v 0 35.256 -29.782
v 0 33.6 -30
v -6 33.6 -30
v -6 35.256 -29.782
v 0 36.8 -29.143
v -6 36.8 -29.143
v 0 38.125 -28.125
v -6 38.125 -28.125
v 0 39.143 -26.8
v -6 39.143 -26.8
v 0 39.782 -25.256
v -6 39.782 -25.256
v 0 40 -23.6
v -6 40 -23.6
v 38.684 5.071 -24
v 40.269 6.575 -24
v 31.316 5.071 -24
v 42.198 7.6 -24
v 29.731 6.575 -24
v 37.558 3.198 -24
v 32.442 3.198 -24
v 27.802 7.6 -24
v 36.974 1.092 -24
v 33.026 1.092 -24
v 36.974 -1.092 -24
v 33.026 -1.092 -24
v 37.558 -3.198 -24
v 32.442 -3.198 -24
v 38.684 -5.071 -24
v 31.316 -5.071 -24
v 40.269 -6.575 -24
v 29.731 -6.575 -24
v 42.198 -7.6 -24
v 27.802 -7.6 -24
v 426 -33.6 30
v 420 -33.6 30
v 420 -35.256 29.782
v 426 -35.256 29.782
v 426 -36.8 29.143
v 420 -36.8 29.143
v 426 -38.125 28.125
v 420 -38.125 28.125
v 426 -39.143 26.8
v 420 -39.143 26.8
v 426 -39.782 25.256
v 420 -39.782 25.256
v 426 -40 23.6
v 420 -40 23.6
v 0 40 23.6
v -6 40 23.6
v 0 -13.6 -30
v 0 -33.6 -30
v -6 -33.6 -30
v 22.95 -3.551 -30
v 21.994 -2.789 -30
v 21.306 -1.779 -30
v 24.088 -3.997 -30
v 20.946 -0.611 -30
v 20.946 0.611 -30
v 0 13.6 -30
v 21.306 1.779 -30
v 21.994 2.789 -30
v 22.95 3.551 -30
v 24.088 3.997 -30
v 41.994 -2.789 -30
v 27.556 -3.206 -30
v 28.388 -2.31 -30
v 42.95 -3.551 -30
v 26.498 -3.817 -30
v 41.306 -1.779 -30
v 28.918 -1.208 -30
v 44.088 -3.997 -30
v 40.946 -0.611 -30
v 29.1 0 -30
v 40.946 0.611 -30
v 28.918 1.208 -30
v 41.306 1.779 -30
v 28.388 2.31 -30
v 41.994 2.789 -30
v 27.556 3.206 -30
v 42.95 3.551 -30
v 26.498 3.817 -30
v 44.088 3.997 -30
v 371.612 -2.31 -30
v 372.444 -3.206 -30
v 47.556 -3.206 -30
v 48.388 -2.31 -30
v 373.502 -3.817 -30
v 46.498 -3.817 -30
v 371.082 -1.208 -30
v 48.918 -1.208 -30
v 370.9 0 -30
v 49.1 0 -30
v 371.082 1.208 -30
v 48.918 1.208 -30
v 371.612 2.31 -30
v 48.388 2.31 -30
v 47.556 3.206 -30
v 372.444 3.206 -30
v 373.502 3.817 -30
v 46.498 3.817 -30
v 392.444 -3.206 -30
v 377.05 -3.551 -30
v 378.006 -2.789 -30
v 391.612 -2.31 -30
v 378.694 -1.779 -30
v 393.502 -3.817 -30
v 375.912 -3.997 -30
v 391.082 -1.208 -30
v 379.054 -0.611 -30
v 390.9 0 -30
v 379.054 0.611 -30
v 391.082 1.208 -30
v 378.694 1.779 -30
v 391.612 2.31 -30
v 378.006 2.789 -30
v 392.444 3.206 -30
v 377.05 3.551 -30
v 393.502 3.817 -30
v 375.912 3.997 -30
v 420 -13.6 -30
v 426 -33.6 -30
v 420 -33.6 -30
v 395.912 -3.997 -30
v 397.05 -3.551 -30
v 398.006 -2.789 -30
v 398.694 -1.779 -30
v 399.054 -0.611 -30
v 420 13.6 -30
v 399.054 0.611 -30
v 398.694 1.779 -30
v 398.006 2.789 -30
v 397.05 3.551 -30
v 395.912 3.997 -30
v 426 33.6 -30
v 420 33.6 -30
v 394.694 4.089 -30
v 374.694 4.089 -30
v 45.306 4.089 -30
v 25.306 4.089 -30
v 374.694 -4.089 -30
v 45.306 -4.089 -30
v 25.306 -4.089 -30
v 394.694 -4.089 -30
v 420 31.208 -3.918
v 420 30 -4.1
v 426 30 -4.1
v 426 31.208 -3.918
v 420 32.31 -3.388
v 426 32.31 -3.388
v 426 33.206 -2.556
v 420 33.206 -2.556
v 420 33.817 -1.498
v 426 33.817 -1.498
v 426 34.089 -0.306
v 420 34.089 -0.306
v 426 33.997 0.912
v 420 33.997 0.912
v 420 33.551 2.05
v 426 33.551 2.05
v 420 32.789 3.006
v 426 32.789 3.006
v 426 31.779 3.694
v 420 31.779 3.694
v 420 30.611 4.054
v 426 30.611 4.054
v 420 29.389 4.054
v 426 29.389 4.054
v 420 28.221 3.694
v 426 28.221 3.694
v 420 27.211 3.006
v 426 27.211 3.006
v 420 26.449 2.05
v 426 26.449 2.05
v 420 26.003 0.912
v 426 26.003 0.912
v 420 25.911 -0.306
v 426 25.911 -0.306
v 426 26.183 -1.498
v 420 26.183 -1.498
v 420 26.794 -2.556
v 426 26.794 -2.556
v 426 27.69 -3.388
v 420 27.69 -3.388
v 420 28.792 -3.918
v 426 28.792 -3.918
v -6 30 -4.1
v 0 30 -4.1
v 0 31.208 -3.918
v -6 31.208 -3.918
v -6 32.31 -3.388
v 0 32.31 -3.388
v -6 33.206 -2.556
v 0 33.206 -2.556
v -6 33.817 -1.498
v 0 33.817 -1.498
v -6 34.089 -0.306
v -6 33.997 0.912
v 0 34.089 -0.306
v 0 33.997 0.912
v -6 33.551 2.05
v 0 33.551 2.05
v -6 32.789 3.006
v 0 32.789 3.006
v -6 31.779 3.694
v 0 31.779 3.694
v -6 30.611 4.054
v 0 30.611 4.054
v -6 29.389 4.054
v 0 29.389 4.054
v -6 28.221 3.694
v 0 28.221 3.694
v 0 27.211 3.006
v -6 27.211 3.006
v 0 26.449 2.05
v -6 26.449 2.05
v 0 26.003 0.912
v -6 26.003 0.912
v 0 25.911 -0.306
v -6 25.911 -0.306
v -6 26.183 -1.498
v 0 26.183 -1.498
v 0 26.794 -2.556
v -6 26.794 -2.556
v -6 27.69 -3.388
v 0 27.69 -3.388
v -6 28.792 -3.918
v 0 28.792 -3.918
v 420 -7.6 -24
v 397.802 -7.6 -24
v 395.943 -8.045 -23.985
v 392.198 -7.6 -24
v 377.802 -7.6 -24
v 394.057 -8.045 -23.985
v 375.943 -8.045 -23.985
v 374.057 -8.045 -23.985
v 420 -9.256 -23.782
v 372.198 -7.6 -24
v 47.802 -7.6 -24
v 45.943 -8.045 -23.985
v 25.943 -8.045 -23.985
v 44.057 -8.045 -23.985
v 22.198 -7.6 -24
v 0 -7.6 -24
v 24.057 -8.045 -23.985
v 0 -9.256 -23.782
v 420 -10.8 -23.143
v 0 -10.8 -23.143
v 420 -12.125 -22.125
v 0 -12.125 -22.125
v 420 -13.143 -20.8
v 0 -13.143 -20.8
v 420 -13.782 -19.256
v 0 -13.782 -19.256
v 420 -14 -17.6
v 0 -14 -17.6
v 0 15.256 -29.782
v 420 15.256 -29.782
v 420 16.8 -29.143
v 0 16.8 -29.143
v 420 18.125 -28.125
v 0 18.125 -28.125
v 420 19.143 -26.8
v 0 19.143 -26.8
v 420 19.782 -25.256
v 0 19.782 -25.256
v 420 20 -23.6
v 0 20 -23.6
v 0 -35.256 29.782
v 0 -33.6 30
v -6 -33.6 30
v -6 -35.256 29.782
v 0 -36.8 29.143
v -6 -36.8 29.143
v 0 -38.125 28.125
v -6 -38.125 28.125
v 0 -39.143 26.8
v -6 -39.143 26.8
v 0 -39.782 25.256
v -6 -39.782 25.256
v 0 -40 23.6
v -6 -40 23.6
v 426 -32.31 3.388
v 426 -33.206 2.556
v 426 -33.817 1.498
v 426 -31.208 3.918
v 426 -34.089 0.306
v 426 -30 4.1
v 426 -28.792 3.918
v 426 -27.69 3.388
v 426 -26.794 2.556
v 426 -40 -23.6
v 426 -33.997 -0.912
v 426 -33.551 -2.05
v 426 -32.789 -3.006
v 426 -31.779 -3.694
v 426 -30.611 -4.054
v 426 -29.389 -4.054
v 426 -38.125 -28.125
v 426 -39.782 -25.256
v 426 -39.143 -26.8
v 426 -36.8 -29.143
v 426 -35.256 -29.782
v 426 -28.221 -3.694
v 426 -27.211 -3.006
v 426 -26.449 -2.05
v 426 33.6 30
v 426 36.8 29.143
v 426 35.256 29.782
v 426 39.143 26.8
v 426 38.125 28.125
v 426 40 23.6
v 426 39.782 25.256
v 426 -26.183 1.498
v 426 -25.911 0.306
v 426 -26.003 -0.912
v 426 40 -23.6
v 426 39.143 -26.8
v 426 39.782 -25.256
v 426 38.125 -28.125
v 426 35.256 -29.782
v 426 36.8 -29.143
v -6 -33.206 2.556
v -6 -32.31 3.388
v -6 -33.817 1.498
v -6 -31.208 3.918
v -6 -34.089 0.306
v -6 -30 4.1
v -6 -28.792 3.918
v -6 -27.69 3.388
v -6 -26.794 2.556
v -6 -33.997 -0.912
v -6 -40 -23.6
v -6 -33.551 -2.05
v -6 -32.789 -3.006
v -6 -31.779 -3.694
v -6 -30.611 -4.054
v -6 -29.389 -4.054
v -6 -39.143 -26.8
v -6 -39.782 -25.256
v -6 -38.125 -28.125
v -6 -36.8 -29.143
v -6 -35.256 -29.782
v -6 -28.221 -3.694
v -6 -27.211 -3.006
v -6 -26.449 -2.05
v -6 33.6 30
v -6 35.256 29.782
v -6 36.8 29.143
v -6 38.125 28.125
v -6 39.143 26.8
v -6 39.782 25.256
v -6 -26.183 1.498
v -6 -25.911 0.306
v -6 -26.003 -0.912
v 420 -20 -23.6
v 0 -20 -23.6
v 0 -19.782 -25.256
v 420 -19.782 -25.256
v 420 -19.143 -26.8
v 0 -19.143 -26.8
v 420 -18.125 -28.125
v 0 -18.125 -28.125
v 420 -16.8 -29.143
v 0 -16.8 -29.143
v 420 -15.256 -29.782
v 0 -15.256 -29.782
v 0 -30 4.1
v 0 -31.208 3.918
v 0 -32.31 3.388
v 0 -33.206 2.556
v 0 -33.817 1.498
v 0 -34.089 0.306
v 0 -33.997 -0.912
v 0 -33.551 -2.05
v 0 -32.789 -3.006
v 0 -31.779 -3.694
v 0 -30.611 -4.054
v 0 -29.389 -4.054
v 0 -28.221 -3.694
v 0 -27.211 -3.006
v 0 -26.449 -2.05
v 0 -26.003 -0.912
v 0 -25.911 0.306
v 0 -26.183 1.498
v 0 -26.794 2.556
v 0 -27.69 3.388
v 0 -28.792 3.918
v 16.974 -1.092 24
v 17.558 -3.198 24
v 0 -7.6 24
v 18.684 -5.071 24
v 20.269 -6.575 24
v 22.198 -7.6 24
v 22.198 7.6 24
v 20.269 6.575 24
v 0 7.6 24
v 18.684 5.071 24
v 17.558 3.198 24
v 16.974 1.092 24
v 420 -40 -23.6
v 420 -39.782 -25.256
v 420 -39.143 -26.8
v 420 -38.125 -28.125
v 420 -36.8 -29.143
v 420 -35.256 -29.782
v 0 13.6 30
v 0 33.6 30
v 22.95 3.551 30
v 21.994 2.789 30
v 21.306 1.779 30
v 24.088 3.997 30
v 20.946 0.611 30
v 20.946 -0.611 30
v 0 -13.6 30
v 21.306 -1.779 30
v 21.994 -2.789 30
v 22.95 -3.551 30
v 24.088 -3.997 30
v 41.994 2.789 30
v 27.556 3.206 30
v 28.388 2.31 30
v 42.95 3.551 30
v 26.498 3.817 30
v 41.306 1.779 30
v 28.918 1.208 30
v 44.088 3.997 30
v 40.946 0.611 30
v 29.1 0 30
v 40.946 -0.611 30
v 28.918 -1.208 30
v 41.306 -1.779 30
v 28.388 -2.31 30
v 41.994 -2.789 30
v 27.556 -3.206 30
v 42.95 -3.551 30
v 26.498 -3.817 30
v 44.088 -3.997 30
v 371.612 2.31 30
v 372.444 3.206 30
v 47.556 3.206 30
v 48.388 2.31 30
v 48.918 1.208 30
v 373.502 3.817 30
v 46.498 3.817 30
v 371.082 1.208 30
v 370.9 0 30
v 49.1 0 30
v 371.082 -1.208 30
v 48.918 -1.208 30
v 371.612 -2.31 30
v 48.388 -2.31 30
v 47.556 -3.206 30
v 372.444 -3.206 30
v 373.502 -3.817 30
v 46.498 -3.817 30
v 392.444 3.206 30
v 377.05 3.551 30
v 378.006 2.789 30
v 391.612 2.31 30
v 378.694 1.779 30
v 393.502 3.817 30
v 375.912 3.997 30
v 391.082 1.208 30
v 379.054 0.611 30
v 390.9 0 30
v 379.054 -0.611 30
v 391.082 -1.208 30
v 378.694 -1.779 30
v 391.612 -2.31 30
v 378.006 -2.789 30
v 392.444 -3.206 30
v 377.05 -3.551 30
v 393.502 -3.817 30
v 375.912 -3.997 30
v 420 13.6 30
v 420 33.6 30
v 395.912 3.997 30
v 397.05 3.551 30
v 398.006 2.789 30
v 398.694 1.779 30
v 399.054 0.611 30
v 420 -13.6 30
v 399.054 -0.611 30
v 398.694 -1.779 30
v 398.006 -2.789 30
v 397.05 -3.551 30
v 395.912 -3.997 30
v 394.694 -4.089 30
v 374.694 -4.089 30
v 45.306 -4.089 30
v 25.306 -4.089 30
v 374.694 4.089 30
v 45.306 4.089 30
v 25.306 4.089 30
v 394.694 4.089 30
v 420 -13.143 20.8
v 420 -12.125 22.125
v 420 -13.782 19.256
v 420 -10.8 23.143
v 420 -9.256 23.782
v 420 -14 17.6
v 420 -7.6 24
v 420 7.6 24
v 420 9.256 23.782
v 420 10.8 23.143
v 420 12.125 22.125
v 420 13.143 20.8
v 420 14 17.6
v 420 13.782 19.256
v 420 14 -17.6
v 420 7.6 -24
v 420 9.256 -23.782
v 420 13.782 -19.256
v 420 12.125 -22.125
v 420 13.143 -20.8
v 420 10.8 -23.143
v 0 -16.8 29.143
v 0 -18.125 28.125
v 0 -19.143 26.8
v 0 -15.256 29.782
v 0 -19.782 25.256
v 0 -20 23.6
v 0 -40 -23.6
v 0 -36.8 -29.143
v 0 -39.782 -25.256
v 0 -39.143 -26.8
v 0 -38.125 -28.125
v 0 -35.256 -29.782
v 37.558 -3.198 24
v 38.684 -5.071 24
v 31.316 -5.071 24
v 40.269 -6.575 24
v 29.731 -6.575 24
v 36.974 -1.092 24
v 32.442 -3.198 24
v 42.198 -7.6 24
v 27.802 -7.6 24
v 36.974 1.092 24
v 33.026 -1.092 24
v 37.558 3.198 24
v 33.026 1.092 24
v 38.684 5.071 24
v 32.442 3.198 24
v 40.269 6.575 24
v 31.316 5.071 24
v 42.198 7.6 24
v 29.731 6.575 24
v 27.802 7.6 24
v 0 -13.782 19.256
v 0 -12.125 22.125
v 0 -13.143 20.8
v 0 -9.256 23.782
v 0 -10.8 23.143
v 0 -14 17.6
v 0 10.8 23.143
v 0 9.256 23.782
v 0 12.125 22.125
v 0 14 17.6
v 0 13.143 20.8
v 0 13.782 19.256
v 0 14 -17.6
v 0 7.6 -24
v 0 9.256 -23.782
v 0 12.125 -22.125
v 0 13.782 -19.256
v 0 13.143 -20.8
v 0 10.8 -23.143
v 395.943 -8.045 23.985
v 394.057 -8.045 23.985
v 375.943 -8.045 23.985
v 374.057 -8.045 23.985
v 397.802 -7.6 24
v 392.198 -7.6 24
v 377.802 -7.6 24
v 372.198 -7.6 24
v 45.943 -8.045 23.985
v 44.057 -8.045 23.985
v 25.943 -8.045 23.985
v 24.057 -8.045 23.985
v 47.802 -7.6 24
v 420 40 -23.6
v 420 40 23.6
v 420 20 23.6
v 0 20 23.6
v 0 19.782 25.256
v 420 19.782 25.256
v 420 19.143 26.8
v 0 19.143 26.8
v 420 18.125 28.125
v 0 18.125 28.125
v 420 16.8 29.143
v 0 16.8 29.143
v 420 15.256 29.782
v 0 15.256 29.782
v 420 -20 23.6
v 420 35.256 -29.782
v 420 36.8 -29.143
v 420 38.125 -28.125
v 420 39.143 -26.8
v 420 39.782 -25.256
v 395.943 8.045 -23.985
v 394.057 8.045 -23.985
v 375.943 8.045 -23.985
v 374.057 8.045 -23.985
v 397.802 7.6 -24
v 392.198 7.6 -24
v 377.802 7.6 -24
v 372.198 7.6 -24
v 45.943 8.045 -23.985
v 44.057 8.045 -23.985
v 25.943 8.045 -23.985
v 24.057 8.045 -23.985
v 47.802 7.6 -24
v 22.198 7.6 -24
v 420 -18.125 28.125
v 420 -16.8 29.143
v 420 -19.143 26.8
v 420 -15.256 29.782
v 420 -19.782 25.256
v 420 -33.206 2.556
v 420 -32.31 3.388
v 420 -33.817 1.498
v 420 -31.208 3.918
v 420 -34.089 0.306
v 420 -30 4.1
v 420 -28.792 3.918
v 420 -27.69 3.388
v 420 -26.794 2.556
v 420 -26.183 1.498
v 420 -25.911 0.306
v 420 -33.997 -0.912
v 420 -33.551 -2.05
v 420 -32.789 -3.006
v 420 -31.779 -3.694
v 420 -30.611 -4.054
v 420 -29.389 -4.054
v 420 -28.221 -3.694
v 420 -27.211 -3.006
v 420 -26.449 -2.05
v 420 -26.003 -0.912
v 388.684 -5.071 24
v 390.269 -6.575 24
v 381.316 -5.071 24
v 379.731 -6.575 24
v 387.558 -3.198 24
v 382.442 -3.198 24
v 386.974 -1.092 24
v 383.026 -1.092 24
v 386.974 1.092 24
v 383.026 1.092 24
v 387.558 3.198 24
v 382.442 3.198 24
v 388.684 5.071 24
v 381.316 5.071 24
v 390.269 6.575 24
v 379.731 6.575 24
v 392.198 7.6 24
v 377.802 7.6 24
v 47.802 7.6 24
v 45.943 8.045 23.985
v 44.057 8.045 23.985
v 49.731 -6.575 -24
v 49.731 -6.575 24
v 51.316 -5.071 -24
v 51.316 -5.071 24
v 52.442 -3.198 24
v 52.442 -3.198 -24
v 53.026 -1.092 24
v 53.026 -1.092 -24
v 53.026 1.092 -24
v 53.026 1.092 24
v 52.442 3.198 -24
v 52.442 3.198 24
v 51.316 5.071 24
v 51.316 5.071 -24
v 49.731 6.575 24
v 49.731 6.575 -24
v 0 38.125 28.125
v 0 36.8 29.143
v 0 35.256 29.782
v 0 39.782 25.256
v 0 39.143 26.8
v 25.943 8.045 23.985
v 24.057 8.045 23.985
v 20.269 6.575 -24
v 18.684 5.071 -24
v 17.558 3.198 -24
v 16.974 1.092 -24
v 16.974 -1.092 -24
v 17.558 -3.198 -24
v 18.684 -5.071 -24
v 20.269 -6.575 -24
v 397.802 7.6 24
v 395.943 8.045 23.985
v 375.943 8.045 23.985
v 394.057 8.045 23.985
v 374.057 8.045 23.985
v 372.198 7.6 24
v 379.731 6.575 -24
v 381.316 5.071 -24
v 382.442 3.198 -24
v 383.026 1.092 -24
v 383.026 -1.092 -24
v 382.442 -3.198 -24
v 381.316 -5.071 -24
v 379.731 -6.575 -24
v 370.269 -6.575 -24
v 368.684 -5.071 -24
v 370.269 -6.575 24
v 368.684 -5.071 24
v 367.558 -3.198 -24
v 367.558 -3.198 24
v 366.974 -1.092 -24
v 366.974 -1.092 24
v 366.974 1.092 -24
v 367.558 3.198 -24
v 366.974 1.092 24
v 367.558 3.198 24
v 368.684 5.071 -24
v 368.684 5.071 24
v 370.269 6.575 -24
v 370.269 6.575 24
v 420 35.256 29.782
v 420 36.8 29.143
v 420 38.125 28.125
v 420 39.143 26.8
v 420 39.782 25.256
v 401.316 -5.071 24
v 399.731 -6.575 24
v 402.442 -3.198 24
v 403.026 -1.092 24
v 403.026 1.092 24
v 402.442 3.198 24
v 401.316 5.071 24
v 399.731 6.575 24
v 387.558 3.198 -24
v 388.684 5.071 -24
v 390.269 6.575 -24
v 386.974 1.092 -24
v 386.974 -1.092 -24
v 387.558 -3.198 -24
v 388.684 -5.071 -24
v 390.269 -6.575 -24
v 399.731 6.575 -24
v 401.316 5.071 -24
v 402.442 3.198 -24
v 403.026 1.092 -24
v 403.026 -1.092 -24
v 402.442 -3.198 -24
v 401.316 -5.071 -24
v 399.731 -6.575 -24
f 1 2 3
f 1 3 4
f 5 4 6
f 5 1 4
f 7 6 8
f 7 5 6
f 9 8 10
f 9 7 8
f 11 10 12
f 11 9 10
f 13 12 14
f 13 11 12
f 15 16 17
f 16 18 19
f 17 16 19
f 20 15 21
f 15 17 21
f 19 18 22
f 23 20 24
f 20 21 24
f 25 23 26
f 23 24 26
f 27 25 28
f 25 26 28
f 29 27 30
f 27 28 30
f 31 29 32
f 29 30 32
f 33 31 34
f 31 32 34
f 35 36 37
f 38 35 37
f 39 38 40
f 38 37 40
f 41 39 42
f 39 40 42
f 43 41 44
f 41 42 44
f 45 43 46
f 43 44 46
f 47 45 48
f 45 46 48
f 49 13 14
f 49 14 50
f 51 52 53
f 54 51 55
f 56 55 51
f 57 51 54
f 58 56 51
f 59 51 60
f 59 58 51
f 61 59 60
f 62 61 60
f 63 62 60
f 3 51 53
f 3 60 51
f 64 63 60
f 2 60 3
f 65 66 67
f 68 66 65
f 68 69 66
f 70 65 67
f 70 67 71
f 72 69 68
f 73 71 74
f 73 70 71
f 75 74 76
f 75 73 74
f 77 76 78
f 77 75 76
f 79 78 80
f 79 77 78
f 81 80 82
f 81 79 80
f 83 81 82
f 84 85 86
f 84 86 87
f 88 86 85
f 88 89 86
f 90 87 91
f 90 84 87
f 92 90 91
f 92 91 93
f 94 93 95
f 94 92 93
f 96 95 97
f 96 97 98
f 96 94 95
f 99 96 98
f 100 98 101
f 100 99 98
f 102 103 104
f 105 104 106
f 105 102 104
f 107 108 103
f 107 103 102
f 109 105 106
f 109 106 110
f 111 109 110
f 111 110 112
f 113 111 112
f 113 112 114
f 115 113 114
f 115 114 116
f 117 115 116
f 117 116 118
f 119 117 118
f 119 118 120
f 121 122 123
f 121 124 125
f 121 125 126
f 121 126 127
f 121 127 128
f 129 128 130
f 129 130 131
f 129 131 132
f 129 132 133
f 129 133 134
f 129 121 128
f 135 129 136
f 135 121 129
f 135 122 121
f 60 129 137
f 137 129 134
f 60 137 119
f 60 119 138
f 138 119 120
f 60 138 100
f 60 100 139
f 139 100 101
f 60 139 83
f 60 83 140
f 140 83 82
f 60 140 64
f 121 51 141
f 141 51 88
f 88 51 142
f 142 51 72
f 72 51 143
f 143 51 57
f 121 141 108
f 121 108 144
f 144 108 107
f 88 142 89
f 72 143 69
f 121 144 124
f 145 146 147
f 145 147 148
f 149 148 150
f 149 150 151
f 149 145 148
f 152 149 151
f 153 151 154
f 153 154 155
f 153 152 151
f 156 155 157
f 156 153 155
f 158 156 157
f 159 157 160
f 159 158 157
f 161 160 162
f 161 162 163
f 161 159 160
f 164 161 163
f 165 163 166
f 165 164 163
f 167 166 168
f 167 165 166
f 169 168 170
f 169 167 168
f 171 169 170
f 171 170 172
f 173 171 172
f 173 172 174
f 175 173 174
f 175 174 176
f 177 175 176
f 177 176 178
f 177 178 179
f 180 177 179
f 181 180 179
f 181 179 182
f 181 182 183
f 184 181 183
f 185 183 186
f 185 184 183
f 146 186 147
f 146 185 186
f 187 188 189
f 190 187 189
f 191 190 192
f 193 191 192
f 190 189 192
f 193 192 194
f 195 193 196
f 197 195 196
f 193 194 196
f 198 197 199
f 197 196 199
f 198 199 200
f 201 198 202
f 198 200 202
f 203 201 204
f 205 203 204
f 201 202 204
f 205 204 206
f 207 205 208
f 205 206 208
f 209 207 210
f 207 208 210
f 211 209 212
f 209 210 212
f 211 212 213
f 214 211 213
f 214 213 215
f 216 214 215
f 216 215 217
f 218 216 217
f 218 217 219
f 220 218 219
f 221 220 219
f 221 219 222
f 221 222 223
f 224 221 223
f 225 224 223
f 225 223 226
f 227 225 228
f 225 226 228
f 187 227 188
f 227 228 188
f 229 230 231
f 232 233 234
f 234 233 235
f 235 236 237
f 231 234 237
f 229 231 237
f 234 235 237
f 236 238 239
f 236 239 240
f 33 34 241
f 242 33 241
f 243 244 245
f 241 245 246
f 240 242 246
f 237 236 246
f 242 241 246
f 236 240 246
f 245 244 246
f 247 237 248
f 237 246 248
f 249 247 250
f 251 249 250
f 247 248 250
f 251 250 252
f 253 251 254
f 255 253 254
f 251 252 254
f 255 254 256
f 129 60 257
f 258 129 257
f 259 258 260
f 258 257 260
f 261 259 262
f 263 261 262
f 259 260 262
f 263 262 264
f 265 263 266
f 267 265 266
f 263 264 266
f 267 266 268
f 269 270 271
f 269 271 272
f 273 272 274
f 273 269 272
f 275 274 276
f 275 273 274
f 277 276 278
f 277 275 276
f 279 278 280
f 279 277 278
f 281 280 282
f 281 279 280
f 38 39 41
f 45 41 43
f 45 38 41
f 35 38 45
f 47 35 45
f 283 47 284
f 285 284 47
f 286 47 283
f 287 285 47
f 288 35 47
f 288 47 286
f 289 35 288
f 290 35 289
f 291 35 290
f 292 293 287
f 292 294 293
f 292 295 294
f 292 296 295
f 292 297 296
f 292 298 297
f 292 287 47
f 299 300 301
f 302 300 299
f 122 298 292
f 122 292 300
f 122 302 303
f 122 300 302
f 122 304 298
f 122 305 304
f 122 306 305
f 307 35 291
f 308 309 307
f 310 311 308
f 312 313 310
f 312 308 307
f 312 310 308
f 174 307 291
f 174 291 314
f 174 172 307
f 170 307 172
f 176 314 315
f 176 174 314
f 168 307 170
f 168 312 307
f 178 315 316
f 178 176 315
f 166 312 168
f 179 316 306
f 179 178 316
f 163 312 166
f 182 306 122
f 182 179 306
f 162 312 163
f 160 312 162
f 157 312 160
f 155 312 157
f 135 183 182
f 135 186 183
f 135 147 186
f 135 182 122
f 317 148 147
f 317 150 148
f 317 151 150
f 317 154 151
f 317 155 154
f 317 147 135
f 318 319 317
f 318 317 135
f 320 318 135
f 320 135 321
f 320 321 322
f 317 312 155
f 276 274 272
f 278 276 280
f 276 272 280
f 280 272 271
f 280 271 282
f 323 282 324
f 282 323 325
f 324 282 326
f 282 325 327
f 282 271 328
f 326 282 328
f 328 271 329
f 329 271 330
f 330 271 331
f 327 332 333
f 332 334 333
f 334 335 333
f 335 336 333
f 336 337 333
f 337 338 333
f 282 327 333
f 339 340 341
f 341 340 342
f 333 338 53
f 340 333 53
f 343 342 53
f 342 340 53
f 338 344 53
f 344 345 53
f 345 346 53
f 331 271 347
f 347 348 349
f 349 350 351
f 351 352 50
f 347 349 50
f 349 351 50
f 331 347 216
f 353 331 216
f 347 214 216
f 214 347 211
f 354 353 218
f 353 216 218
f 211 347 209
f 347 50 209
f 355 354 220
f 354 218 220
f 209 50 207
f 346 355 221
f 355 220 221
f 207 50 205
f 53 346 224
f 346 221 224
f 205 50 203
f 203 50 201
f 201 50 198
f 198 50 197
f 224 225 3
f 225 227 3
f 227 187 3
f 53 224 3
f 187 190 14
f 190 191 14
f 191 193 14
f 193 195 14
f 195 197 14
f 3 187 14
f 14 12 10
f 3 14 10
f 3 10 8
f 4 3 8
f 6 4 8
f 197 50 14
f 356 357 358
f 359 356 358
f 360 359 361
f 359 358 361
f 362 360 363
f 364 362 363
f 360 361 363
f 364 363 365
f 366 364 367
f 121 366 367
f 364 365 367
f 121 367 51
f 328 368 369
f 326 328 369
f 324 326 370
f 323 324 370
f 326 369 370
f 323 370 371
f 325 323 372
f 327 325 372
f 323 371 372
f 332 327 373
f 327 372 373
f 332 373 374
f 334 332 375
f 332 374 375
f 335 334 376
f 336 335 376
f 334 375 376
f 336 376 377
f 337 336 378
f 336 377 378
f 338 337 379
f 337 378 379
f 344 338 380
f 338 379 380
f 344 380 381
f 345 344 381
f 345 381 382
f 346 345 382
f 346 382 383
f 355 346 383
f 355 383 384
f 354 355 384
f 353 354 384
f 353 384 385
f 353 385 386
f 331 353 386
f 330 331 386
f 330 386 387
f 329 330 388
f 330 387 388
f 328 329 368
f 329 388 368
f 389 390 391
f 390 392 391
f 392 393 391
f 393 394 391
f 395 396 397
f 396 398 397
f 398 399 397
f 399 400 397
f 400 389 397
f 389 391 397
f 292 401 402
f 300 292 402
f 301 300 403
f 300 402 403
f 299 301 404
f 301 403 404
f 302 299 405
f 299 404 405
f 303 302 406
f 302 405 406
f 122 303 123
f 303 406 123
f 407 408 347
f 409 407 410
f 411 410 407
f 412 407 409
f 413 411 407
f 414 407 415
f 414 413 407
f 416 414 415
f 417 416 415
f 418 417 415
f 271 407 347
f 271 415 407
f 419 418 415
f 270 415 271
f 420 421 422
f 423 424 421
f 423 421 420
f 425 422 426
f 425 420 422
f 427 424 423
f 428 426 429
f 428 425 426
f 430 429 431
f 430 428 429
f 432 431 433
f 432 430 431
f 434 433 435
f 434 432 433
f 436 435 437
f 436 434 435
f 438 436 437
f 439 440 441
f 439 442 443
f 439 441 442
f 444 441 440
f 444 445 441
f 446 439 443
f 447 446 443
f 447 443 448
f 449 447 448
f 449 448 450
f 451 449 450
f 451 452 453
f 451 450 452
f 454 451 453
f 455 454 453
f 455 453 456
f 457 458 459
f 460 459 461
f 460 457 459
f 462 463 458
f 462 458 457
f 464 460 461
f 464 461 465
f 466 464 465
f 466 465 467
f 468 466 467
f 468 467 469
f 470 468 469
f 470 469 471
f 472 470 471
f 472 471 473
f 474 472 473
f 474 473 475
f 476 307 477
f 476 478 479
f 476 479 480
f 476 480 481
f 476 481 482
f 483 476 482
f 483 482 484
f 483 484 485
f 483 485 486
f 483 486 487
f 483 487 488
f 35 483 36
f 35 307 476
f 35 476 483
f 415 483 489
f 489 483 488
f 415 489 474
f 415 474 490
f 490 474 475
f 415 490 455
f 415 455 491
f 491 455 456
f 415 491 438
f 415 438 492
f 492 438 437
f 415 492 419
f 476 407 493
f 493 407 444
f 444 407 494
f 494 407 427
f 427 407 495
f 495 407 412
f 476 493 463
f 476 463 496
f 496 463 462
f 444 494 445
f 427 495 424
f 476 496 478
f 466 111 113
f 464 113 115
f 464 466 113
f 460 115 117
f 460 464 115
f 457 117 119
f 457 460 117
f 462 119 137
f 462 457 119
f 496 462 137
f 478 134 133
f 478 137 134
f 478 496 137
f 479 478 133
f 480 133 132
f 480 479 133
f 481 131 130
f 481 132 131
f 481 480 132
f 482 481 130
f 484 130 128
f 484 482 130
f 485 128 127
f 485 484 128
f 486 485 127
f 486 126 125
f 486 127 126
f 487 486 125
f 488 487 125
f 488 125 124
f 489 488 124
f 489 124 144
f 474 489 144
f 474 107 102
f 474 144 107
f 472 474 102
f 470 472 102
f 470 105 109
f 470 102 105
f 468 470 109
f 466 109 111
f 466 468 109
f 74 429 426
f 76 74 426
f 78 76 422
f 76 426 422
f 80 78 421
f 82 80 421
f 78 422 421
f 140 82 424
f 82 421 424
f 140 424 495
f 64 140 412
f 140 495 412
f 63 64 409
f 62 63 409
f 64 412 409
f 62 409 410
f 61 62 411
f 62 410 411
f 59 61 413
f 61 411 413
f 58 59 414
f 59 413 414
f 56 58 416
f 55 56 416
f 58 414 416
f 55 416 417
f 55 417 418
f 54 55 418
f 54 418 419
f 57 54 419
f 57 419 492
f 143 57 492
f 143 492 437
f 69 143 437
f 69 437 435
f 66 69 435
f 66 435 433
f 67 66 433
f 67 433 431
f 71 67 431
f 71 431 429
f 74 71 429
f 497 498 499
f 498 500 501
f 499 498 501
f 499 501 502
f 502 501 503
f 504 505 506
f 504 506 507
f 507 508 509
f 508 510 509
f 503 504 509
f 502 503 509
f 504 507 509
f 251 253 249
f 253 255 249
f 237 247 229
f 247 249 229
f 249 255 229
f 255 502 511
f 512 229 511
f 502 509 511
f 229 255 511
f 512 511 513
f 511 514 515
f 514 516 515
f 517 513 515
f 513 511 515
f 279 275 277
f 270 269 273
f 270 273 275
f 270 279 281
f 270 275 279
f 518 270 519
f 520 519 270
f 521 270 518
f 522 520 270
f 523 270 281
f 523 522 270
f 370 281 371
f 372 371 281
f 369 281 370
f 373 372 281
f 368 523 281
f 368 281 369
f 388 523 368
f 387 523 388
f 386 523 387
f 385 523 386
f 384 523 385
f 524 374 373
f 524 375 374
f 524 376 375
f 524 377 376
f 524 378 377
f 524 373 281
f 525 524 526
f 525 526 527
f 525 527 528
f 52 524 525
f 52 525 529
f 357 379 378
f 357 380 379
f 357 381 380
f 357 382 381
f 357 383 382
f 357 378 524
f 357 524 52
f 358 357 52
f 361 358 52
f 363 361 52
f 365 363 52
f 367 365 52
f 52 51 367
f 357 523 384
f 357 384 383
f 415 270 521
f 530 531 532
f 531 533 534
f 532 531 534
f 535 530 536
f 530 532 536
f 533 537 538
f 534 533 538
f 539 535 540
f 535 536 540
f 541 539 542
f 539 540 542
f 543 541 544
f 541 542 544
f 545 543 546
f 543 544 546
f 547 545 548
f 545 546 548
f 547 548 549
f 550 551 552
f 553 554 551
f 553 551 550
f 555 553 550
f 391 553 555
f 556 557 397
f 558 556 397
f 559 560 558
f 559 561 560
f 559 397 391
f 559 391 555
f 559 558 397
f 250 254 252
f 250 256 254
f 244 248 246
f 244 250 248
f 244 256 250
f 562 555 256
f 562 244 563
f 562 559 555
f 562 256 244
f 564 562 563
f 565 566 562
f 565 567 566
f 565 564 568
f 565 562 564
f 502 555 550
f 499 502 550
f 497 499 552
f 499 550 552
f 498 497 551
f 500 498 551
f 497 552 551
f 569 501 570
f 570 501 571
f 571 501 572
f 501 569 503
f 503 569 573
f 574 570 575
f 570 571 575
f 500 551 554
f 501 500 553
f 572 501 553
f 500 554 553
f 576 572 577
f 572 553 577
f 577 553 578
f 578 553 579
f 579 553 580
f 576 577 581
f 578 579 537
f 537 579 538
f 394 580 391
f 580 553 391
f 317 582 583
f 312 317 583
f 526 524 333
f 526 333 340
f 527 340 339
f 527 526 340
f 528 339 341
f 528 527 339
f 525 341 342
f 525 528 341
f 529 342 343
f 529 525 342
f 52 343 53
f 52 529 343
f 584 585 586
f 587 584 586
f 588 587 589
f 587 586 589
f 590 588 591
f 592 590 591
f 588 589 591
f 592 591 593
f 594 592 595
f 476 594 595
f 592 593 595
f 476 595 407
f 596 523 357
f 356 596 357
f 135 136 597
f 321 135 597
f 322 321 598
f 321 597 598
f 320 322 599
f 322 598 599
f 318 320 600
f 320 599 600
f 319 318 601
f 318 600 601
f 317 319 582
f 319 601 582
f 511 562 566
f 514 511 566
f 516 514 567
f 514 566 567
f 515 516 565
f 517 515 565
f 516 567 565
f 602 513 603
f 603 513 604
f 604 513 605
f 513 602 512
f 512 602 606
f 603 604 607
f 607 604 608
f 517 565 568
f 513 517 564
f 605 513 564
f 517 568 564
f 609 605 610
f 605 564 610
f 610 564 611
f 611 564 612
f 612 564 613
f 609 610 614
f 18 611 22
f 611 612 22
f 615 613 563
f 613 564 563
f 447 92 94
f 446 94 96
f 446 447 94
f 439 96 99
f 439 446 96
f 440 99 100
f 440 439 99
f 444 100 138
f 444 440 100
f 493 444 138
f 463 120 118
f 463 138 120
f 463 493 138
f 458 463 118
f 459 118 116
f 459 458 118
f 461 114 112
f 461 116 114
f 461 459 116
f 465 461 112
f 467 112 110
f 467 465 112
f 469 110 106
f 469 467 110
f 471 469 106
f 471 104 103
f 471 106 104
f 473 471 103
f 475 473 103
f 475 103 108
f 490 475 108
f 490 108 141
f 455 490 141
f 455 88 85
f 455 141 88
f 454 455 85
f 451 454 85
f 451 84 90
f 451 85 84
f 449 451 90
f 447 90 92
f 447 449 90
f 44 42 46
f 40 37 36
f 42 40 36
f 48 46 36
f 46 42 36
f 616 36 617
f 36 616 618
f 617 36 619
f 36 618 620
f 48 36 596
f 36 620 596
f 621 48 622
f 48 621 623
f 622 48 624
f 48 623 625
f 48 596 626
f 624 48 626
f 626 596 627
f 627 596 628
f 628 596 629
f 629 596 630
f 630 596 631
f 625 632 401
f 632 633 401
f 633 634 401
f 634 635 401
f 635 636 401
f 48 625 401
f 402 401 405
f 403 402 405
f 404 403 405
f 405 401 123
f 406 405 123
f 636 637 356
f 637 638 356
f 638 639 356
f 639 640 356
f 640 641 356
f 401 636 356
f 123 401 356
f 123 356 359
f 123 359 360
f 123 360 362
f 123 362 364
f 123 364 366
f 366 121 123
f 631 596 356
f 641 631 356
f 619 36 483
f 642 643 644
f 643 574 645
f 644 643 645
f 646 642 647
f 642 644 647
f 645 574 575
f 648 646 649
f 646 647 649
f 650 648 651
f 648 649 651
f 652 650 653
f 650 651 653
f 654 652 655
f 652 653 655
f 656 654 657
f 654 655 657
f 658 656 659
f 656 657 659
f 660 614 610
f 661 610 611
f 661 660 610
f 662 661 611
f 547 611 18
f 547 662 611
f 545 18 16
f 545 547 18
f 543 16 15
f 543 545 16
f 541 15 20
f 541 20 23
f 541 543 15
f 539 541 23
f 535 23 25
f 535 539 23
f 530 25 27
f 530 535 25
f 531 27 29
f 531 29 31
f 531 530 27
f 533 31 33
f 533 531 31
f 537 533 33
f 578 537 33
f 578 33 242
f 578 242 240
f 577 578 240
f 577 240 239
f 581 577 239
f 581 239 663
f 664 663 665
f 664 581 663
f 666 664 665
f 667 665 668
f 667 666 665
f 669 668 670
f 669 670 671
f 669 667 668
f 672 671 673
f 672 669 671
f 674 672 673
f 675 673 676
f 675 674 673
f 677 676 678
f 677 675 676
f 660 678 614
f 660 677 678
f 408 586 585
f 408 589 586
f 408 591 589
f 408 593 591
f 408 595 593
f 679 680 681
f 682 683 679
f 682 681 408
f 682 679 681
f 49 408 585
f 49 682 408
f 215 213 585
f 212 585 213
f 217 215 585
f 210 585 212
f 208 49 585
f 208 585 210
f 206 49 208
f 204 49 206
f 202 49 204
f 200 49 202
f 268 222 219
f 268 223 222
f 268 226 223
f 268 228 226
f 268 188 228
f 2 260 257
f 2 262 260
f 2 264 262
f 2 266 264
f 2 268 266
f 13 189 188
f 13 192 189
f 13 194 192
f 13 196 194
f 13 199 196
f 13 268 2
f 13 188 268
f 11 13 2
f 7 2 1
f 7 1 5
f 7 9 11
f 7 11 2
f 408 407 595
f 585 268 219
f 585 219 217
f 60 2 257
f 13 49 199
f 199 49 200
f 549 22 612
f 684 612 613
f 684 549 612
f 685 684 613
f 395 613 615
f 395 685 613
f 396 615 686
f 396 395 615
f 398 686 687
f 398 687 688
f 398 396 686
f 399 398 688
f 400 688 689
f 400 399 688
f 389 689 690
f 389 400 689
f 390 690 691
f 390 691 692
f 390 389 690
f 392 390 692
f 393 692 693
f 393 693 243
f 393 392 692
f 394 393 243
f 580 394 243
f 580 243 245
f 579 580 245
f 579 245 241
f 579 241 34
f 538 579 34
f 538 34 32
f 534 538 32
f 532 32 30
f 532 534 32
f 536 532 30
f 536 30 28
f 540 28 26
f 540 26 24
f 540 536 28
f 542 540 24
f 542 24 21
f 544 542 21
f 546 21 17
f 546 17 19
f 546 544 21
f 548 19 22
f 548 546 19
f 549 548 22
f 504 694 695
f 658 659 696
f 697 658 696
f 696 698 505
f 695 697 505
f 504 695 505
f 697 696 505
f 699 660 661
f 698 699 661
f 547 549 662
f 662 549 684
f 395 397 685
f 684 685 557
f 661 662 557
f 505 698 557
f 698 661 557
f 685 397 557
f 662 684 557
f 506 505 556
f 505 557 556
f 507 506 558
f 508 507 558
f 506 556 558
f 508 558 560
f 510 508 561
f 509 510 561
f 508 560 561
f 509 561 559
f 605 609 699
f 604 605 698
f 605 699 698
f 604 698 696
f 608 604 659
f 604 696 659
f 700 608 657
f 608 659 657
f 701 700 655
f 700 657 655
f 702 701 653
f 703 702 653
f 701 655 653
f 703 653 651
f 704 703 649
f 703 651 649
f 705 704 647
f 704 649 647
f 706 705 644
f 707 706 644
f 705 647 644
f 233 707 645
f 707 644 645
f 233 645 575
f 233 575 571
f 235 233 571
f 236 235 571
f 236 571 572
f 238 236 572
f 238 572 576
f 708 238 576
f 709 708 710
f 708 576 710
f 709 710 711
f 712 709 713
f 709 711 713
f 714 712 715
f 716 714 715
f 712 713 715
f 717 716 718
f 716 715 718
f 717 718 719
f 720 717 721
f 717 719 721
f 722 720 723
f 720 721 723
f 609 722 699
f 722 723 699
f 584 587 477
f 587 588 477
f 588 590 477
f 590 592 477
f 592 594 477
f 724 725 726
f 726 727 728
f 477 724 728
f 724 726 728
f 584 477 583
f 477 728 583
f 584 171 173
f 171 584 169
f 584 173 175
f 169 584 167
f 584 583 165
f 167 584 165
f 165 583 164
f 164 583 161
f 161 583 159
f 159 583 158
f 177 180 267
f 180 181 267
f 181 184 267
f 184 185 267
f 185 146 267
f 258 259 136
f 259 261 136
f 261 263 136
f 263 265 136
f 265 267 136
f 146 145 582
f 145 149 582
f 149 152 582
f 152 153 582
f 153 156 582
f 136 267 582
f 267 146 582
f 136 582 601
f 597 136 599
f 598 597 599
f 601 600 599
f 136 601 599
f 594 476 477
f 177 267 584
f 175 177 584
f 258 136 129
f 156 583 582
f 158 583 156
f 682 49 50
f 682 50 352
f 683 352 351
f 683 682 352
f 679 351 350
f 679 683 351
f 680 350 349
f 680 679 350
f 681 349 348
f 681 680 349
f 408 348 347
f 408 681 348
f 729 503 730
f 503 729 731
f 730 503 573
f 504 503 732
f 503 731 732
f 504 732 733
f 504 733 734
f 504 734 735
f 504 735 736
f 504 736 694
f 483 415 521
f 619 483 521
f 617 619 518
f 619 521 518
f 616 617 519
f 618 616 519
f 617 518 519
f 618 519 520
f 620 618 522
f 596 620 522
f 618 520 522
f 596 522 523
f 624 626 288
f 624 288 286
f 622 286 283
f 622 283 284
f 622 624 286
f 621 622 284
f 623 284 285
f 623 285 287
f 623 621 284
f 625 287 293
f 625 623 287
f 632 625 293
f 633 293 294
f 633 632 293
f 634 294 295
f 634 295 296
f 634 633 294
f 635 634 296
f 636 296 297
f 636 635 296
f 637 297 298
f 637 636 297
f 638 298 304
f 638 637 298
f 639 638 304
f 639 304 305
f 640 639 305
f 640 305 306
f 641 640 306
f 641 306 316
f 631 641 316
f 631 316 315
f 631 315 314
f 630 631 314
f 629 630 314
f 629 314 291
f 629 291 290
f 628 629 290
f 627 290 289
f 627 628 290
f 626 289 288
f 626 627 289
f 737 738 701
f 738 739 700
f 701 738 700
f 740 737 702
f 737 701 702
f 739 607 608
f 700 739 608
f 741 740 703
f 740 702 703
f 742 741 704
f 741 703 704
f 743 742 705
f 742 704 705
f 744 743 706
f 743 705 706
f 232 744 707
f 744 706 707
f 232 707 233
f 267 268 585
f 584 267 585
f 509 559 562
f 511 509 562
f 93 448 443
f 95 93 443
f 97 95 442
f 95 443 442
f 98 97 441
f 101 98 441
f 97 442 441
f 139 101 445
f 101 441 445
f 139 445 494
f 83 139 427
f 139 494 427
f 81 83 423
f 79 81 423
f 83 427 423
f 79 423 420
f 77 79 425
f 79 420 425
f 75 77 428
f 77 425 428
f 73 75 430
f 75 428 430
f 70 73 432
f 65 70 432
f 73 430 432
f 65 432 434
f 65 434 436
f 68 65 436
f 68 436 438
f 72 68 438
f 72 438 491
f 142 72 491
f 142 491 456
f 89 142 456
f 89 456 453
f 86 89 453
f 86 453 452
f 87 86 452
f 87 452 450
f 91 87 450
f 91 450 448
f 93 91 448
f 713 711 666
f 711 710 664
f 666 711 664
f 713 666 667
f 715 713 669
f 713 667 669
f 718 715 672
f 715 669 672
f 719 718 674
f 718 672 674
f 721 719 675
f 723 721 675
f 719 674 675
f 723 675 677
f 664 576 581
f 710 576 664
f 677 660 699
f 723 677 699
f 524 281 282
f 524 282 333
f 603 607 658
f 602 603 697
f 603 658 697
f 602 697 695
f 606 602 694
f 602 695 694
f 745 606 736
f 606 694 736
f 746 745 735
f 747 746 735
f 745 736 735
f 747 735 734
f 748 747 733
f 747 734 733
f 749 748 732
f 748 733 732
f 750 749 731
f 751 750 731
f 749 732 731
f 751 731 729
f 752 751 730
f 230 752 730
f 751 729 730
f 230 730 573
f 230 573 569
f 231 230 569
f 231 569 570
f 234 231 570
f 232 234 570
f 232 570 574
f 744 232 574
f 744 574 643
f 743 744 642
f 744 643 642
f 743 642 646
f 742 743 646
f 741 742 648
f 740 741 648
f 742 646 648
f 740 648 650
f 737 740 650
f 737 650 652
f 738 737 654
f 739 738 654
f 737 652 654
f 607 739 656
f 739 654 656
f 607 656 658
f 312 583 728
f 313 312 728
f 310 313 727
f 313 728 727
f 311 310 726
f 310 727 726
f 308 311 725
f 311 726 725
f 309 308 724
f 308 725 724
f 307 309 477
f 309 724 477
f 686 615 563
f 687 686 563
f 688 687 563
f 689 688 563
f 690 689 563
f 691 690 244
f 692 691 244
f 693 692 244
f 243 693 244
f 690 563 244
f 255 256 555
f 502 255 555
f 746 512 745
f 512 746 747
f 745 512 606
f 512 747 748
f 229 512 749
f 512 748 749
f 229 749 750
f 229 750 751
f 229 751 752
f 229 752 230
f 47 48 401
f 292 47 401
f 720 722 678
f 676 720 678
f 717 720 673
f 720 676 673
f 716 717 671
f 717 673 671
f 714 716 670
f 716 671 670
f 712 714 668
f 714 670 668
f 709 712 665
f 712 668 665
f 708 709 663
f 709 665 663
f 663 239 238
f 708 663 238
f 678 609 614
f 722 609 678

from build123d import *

# Parameters (mm, degrees)
DODANIE_WYCI_GNI_CIE2_DEPTH = 420
SZKIC4_R                    = 4.1
DODANIE_WYCI_GNI_CIE3_DEPTH = 6
DODANIE_WYCI_GNI_CIE4_REACH = 434.06
SZKIC5_R                    = 8.1
SZKIC5_R_2                  = 4.1
SZKIC6_R                    = 4.1
WYTNIJ_WYCI_GNI_CIE1_DEPTH  = 433.060180993


with BuildPart() as part:
    # Szkic3 → Dodanie-wyciągnięcie2 (new body)
    with BuildSketch(Plane(origin=(0, 0, 0), x_dir=(0, 0, -1), z_dir=(1, 0, 0))):
        with BuildLine():
            Line((-23.6, -20), (23.6, -20))
            ThreePointArc((23.6, -20), (28.1254834, -18.1254834), (30, -13.6))
            Line((30, -13.6), (30, 13.6))
            ThreePointArc((30, 13.6), (28.1254834, 18.1254834), (23.6, 20))
            Line((23.6, 20), (-23.6, 20))
            ThreePointArc((-23.6, 20), (-28.1254834, 18.1254834), (-30, 13.6))
            Line((-30, 13.6), (-30, -13.6))
            ThreePointArc((-30, -13.6), (-28.1254834, -18.1254834), (-23.6, -20))
        make_face()
        with BuildLine():
            Line((-17.6, 14), (17.6, 14))
            ThreePointArc((17.6, 14), (22.1254834, 12.1254834), (24, 7.6))
            Line((24, 7.6), (24, -7.6))
            ThreePointArc((24, -7.6), (22.1254834, -12.1254834), (17.6, -14))
            Line((17.6, -14), (-17.6, -14))
            ThreePointArc((-17.6, -14), (-22.1254834, -12.1254834), (-24, -7.6))
            Line((-24, -7.6), (-24, 7.6))
            ThreePointArc((-24, 7.6), (-22.1254834, 12.1254834), (-17.6, 14))
        make_face(mode=Mode.SUBTRACT)
    extrude(amount=DODANIE_WYCI_GNI_CIE2_DEPTH)

    # Szkic4 → Dodanie-wyciągnięcie3 (add)
    with BuildSketch(Plane(origin=(420, 0, 0), x_dir=(0, 0, -1), z_dir=(1, 0, 0))):
        with BuildLine():
            Line((-23.6, -40), (23.6, -40))
            ThreePointArc((23.6, -40), (28.1254834, -38.1254834), (30, -33.6))
            Line((30, -33.6), (30, 33.6))
            ThreePointArc((30, 33.6), (28.1254834, 38.1254834), (23.6, 40))
            Line((23.6, 40), (-23.6, 40))
            ThreePointArc((-23.6, 40), (-28.1254834, 38.1254834), (-30, 33.6))
            Line((-30, 33.6), (-30, -33.6))
            ThreePointArc((-30, -33.6), (-28.1254834, -38.1254834), (-23.6, -40))
        make_face()
        with Locations((0, 30)):
            Circle(SZKIC4_R, mode=Mode.SUBTRACT)
        with Locations(Location((0, -30, 0), (0, 0, 180))):
            Circle(SZKIC4_R, mode=Mode.SUBTRACT)
    dodanie_wyci_gni_cie3 = extrude(amount=DODANIE_WYCI_GNI_CIE3_DEPTH)

    # Szkic5 → Dodanie-wyciągnięcie4 (add, up to next)
    with BuildSketch(Plane.XY.offset(30), mode=Mode.PRIVATE) as dodanie_wyci_gni_cie4_sk1:
        with Locations(Location((25, 0, 0), (0, 0, 69.763291811))):
            Circle(SZKIC5_R)
        with Locations((25, 0)):
            Circle(SZKIC5_R_2, mode=Mode.SUBTRACT)
    dodanie_wyci_gni_cie4_tool1 = extrude(dodanie_wyci_gni_cie4_sk1.sketch, amount=-DODANIE_WYCI_GNI_CIE4_REACH, mode=Mode.PRIVATE) - part.part
    # Szkic5 → Dodanie-wyciągnięcie4 (add, up to next)
    with BuildSketch(Plane.XY.offset(30), mode=Mode.PRIVATE) as dodanie_wyci_gni_cie4_sk2:
        with Locations(Location((45, 0, 0), (0, 0, 69.763291811))):
            Circle(SZKIC5_R)
        with Locations((45, 0)):
            Circle(SZKIC5_R_2, mode=Mode.SUBTRACT)
    dodanie_wyci_gni_cie4_tool2 = extrude(dodanie_wyci_gni_cie4_sk2.sketch, amount=-DODANIE_WYCI_GNI_CIE4_REACH, mode=Mode.PRIVATE) - part.part
    dodanie_wyci_gni_cie4_1 = dodanie_wyci_gni_cie4_tool1.solids().sort_by_distance((22.277461, -7.38504, 30))[0]
    add(dodanie_wyci_gni_cie4_1)
    dodanie_wyci_gni_cie4_2 = dodanie_wyci_gni_cie4_tool2.solids().sort_by_distance((42.277461, -7.38504, 30))[0]
    add(dodanie_wyci_gni_cie4_2)
    dodanie_wyci_gni_cie4 = dodanie_wyci_gni_cie4_1 + dodanie_wyci_gni_cie4_2  # Dodanie-wyciągnięcie4 as one shape, for the pattern or mirror that repeats it

    # Szkic6 → Wytnij-wyciągnięcie1 (cut, through all)
    with BuildSketch(Plane.XY.offset(30)):
        with Locations((25, 0)):
            Circle(SZKIC6_R)
        with Locations((45, 0)):
            Circle(SZKIC6_R)
    wytnij_wyci_gni_cie1 = extrude(amount=-WYTNIJ_WYCI_GNI_CIE1_DEPTH, mode=Mode.SUBTRACT)

    # Lustro3: Dodanie-wyciągnięcie4, Wytnij-wyciągnięcie1 across plane
    add(dodanie_wyci_gni_cie4.mirror(Plane(origin=(210, 0, 0), x_dir=(0, 0, 1), z_dir=(1, 0, 0))))
    add(wytnij_wyci_gni_cie1.mirror(Plane(origin=(210, 0, 0), x_dir=(0, 0, 1), z_dir=(1, 0, 0))), mode=Mode.SUBTRACT)

    # Lustro4: Dodanie-wyciągnięcie3 across plane
    add(dodanie_wyci_gni_cie3.mirror(Plane(origin=(210, 0, 0), x_dir=(0, 0, 1), z_dir=(1, 0, 0))))


solid = part.part
